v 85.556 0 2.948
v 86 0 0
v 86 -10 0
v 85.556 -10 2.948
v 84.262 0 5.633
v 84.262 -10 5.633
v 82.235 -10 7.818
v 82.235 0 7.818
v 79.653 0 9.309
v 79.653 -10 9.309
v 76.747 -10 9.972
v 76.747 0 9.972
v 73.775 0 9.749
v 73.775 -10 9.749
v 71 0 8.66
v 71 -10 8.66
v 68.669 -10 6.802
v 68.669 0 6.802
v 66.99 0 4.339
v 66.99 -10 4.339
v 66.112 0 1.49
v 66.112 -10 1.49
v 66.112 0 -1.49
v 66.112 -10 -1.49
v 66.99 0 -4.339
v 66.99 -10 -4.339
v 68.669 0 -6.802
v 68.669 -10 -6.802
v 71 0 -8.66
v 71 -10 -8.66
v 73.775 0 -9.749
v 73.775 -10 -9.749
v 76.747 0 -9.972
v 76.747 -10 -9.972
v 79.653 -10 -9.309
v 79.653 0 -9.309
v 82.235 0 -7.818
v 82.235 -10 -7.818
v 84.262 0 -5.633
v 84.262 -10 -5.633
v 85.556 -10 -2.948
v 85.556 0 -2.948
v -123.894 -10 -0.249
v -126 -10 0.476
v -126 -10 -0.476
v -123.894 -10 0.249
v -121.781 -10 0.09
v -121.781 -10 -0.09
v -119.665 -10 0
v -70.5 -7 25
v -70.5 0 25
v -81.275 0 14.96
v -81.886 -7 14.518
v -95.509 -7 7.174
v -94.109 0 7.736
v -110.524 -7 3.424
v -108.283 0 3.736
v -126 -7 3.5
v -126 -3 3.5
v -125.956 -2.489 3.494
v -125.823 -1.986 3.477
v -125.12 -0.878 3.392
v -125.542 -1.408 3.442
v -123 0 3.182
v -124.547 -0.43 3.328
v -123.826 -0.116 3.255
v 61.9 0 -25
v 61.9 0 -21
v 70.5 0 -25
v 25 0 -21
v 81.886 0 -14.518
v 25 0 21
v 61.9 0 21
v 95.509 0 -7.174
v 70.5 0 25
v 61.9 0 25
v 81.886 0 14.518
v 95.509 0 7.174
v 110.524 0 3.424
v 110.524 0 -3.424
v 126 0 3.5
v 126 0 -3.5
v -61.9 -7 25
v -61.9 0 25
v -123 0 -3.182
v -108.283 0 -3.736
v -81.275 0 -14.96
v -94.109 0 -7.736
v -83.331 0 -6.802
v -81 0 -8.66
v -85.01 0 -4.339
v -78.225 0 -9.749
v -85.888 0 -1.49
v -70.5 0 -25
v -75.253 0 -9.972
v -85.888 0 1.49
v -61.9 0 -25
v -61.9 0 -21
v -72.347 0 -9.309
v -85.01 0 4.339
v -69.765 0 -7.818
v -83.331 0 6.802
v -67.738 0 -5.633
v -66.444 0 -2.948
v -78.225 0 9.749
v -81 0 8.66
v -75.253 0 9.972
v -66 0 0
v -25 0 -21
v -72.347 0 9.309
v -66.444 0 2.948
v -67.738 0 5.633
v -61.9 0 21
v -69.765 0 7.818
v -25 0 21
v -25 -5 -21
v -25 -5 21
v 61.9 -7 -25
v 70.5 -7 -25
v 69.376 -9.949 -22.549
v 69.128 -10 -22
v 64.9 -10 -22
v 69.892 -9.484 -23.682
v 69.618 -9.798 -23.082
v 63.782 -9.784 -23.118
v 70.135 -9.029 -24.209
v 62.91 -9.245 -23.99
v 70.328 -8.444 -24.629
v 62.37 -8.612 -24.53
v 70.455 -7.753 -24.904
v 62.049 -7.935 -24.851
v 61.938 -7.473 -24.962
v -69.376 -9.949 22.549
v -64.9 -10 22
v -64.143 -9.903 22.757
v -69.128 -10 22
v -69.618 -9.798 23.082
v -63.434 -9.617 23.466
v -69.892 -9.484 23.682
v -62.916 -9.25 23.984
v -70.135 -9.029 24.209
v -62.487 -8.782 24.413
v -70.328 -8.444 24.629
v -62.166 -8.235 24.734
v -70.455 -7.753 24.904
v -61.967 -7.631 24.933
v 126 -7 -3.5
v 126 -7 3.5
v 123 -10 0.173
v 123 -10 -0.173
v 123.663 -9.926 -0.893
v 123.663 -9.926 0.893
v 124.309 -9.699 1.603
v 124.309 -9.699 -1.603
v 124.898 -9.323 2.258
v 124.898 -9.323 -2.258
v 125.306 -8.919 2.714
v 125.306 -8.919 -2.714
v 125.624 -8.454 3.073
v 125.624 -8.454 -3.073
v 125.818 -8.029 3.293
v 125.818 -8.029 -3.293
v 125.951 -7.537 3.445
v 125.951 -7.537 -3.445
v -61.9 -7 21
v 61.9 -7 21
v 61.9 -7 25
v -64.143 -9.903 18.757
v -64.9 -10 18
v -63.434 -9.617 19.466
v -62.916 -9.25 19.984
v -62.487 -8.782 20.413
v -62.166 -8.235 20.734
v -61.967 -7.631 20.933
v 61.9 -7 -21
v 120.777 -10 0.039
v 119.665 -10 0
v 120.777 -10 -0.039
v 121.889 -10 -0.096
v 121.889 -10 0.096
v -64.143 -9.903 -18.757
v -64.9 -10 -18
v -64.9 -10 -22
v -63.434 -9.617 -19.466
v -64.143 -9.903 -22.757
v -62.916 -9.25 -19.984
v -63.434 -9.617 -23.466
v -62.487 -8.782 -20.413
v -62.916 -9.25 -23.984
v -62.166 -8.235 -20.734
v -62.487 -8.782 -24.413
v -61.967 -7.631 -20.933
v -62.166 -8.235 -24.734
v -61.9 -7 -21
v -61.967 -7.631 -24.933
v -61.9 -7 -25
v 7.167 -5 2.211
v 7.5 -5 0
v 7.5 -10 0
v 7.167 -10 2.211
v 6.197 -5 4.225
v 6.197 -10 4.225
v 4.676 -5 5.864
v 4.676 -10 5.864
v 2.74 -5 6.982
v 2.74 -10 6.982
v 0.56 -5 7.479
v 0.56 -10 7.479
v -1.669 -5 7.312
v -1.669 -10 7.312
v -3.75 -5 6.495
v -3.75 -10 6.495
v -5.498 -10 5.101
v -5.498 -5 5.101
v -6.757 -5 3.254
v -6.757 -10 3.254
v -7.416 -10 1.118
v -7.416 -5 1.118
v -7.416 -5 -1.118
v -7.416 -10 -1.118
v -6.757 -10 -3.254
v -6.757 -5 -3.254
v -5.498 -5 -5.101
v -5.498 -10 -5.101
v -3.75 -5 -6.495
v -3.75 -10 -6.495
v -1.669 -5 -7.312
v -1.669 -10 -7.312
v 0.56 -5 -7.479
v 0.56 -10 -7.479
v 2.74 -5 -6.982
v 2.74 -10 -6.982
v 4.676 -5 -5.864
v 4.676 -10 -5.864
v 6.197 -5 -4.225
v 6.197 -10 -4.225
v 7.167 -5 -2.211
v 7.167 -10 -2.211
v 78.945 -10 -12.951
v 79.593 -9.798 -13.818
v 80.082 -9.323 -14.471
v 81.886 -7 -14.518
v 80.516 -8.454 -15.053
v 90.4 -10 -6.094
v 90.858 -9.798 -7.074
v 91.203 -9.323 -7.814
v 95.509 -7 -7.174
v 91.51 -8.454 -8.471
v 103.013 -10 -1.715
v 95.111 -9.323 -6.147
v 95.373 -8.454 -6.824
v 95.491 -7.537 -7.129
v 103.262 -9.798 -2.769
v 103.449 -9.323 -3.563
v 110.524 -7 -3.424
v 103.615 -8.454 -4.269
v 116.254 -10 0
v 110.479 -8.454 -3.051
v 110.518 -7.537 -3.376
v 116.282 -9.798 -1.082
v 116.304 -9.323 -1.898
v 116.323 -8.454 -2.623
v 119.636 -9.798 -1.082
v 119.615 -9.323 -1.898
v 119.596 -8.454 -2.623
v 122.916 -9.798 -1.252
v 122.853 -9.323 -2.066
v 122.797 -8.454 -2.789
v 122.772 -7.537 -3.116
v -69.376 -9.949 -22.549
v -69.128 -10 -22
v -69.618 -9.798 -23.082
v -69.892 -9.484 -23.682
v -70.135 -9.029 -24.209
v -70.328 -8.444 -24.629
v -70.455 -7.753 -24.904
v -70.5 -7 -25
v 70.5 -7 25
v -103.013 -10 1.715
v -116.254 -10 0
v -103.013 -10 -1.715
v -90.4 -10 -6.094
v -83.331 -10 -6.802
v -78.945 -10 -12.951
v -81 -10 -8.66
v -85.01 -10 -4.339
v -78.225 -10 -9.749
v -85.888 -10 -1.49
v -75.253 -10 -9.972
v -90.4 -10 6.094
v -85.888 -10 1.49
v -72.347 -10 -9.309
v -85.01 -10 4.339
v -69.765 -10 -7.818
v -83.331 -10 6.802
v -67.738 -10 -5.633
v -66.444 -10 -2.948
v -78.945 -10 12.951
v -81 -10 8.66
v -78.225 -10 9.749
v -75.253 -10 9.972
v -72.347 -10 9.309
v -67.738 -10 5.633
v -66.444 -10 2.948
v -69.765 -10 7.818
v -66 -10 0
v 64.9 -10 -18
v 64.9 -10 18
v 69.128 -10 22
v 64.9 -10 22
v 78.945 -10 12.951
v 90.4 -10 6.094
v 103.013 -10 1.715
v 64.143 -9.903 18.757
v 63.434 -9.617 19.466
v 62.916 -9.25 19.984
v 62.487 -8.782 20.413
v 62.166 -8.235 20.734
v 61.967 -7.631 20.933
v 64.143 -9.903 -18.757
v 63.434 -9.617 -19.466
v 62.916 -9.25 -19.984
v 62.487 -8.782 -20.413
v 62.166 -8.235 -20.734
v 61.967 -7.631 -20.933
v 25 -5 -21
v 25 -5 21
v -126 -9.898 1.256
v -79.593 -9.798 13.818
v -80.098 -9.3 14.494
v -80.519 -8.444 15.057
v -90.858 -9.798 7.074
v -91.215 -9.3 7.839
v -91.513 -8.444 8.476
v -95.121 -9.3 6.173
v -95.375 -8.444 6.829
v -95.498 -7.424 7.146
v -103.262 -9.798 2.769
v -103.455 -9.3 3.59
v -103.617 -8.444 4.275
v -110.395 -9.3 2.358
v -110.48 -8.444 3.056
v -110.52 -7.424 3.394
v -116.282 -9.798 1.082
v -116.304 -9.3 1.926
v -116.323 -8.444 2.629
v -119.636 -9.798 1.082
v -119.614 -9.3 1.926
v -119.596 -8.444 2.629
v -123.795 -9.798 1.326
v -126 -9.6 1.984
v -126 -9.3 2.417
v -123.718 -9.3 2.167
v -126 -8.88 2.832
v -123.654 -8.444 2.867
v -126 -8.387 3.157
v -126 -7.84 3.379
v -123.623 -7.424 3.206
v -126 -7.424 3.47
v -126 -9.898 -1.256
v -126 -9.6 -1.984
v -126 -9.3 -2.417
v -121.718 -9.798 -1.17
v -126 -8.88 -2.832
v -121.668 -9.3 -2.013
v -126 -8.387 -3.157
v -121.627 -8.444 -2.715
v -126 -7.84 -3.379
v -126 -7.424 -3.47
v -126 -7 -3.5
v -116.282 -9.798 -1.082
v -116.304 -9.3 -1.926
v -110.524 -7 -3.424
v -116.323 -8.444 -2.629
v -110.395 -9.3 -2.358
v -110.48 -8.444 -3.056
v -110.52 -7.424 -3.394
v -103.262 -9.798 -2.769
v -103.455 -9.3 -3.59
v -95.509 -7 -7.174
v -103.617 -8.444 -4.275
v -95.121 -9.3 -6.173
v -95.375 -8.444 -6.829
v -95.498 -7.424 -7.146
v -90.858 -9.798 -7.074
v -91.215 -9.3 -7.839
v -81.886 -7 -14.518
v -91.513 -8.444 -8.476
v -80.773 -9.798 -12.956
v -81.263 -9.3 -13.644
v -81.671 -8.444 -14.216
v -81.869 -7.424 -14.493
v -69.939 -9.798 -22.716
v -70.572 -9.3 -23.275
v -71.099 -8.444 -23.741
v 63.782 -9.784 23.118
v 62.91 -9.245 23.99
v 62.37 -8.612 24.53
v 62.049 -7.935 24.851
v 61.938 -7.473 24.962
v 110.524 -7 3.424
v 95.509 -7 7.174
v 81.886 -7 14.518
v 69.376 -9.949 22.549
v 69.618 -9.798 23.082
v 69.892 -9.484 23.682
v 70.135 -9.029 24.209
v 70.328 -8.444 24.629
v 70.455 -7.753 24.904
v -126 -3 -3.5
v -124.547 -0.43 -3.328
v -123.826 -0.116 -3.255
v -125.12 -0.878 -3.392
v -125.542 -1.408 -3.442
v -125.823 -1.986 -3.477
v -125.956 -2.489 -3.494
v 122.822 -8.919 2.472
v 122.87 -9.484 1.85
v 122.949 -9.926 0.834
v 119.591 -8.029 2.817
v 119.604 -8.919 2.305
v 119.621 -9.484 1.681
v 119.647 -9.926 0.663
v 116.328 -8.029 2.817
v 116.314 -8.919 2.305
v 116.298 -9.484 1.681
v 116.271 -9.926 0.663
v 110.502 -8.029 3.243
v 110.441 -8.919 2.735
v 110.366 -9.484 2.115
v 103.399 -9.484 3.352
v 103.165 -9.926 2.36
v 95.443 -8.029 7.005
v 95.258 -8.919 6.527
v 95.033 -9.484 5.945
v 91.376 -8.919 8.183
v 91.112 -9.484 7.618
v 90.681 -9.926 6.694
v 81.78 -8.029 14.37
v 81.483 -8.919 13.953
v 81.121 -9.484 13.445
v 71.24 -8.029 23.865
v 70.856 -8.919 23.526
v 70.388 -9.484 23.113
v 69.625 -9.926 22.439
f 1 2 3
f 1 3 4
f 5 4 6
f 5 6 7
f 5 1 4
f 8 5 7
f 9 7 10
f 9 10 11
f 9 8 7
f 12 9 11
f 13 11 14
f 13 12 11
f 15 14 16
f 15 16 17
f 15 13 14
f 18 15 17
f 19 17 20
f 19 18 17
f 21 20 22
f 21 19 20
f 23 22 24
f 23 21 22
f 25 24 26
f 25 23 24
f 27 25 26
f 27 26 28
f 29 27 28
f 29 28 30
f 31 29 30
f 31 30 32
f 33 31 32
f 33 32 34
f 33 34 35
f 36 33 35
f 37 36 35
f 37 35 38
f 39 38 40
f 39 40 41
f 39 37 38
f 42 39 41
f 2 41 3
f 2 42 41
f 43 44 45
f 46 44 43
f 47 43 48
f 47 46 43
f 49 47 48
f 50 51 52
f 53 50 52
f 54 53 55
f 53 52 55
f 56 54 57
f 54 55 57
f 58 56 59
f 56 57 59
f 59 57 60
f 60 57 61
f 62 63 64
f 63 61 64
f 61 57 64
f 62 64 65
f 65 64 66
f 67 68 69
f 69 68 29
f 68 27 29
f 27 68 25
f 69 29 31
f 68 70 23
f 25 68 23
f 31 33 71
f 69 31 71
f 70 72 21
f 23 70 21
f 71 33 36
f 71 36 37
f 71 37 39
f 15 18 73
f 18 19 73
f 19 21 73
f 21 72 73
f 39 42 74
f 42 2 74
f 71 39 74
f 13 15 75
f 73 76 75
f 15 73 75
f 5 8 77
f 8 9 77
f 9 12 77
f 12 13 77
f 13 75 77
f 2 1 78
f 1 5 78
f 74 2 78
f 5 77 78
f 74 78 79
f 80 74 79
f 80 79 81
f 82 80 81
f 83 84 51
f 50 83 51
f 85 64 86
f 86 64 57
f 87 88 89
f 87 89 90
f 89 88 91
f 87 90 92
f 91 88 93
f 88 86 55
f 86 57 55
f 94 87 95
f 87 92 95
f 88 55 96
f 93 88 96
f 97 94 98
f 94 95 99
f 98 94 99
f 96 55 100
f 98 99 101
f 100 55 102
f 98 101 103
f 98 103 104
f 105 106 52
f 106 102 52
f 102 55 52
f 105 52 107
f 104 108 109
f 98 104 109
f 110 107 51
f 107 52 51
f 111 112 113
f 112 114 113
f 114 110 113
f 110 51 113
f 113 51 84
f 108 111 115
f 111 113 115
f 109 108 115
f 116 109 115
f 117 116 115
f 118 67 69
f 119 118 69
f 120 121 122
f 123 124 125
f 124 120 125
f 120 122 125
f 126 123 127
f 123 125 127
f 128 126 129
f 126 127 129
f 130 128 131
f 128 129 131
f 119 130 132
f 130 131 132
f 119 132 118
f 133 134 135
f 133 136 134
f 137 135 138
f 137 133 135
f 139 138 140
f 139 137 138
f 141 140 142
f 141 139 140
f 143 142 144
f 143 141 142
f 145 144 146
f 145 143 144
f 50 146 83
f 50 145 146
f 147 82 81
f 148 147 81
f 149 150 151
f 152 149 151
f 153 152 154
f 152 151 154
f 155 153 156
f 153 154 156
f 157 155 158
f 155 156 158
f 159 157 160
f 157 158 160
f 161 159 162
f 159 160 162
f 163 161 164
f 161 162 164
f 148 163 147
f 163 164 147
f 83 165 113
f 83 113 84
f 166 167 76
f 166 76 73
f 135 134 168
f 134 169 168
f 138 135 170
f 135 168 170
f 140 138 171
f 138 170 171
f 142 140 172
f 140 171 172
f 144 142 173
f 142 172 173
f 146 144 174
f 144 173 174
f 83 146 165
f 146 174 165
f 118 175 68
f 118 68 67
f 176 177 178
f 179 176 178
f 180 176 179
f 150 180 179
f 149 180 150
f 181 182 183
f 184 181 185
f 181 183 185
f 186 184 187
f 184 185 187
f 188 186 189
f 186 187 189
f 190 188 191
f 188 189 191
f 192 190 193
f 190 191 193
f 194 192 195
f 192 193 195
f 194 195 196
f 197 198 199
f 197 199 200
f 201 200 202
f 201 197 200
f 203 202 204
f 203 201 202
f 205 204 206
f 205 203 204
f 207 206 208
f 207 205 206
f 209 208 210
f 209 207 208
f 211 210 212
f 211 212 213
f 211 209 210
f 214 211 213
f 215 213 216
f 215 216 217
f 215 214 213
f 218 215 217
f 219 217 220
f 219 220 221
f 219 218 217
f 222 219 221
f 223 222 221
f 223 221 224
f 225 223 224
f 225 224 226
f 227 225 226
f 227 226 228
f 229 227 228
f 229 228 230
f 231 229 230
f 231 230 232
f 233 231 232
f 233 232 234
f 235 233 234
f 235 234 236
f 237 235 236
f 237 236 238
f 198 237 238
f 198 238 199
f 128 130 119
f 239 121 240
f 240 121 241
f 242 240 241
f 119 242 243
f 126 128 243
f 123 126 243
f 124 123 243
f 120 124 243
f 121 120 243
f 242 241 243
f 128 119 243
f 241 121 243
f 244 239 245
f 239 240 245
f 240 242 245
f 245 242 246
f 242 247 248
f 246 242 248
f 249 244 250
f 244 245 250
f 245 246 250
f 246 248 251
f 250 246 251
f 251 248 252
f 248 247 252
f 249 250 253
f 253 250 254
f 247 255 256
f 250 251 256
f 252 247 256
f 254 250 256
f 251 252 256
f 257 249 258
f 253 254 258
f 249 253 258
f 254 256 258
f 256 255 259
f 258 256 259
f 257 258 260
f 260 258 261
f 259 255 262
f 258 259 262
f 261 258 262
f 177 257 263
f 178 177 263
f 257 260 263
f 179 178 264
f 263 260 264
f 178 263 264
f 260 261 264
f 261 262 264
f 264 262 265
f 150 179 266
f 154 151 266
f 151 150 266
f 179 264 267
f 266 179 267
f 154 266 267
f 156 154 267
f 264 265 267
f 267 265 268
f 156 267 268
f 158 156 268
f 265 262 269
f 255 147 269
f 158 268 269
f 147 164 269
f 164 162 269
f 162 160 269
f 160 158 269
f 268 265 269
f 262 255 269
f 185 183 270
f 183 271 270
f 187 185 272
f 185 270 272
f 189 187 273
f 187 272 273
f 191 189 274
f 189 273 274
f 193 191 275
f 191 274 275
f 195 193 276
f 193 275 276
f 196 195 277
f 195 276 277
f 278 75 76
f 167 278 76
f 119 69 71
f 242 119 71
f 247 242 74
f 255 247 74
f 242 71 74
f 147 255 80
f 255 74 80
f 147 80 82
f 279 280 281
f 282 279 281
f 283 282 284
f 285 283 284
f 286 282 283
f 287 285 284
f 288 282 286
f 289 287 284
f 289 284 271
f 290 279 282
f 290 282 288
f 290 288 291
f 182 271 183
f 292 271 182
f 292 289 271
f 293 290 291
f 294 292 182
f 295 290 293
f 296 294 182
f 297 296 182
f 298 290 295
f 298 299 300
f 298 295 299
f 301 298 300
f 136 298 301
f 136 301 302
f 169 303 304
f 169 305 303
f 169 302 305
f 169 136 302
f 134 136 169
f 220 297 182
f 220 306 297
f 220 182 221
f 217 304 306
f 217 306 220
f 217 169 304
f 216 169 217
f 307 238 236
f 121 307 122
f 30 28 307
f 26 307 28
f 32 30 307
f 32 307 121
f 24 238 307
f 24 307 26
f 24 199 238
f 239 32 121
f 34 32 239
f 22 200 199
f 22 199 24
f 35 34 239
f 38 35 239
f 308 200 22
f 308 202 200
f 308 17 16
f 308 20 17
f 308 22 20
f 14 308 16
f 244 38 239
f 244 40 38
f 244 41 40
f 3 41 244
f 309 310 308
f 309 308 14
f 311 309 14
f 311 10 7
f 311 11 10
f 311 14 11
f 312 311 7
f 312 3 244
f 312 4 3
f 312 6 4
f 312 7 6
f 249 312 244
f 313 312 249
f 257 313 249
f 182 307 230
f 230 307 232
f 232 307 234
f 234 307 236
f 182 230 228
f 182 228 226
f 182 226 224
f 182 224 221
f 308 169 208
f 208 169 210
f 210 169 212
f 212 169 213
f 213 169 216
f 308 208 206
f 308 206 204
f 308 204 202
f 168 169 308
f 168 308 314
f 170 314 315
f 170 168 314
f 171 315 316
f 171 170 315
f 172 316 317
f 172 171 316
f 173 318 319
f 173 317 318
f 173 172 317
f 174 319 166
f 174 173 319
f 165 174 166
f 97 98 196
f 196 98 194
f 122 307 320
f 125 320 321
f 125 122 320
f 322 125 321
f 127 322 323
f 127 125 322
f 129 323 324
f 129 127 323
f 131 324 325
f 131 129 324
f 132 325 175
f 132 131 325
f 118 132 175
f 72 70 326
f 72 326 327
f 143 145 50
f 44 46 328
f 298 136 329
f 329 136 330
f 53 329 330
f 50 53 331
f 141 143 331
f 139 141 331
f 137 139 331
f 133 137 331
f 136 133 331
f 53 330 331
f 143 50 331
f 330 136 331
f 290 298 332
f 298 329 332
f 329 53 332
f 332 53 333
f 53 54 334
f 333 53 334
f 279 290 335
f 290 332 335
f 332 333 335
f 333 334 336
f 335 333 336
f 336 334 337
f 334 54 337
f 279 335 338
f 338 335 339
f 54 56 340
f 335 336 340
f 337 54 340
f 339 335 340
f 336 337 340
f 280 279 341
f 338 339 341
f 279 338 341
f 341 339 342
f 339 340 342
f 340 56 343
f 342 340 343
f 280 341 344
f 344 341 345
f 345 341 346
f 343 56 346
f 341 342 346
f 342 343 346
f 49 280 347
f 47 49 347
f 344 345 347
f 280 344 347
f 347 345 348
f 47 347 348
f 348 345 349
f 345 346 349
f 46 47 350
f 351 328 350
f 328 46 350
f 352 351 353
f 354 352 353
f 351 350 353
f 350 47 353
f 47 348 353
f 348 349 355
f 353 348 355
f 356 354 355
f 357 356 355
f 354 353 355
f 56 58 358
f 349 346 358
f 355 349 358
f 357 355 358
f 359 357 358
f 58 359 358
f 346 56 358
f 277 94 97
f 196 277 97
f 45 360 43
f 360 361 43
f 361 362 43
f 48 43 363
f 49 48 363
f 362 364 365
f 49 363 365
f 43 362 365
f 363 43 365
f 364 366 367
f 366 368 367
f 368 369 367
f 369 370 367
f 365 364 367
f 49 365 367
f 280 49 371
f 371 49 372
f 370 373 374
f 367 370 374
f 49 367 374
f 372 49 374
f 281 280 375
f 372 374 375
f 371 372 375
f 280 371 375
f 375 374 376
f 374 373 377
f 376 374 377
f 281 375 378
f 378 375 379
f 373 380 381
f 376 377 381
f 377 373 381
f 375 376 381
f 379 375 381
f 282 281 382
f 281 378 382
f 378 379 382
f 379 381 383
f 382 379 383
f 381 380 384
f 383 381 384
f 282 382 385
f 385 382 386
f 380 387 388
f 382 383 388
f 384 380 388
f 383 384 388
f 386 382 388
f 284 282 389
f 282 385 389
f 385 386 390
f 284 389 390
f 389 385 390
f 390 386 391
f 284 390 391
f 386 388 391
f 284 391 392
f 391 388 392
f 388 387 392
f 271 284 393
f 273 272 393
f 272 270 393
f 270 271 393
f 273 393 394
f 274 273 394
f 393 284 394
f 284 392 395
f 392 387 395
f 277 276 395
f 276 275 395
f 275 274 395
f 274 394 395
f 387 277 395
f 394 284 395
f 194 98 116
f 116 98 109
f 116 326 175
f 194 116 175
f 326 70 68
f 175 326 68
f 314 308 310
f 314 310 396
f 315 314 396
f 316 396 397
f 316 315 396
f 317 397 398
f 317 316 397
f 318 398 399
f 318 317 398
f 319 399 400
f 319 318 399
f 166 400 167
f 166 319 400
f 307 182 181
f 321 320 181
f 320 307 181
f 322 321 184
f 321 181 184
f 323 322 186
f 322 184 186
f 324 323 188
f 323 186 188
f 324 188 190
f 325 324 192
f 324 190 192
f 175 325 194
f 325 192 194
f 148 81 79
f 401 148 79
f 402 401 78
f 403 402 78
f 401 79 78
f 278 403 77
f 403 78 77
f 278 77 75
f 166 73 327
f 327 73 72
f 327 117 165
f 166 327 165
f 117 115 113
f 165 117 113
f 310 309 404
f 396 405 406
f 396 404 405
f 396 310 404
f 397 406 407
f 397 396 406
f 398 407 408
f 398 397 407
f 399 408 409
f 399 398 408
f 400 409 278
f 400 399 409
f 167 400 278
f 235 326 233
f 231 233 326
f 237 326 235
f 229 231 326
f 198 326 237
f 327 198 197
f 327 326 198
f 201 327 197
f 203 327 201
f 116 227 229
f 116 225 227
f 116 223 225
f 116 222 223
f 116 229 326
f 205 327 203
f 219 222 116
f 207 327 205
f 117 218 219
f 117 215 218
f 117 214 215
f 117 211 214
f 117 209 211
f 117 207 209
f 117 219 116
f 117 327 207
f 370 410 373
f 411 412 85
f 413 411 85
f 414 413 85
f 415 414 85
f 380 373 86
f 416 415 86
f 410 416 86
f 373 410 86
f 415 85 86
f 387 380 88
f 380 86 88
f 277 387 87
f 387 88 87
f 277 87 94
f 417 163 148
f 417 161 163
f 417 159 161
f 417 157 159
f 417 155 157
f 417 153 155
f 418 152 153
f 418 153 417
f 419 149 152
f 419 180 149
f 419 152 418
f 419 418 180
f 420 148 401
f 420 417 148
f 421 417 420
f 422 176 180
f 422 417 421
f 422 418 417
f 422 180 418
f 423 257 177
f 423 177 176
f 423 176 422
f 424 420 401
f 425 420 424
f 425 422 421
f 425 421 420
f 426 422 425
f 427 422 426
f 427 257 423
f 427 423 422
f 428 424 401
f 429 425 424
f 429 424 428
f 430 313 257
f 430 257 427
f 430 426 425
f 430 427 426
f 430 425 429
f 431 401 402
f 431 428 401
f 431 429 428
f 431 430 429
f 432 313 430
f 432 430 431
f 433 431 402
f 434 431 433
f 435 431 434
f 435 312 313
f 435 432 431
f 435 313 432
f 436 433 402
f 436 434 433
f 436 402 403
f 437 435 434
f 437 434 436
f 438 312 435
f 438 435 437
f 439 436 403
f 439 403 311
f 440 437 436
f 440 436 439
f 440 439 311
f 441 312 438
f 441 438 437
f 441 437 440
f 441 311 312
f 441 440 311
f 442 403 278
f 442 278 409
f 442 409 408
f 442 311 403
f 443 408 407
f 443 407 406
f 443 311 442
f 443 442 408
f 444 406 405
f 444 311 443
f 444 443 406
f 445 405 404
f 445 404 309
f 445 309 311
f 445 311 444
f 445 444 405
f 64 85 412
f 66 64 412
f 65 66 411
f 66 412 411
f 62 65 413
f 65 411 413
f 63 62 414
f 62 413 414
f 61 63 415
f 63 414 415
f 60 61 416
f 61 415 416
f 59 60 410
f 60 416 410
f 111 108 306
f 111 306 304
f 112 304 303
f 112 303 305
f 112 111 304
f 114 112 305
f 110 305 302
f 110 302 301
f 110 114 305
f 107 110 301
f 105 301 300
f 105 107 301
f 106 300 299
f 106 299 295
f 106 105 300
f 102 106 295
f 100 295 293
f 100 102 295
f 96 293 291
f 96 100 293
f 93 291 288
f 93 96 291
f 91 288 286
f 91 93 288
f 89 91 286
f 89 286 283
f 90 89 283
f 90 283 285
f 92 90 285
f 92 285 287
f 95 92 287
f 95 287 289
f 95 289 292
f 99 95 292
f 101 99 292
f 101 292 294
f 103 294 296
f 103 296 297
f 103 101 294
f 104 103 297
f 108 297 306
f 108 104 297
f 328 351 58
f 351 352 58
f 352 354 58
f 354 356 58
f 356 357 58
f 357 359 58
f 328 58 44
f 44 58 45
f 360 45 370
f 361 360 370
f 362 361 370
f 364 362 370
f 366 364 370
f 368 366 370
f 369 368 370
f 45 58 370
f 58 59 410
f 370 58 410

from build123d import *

# Parameters (mm, degrees)
F0_R         = 10
F0_R_2       = 7.5
F1_DEPTH     = 10
F2_W         = 50
F2_H         = 42
F2_R         = 7.5
F3_DEPTH     = 5
F4_T1_DEPTH  = 123.8
F4_T3_DEPTH  = 11.5
F4_T5_DEPTH  = 23.6
F4_T7_DEPTH  = 22
F4_T9_DEPTH  = 11.5
F4_T11_DEPTH = 23.6
F4_T14_ANGLE = 71.0490813257
F4_T16_ANGLE = 71.0490813257
F4_T18_ANGLE = 71.0490813257
F4_T20_ANGLE = 71.0490813257
F4_T25_DEPTH = 19
F4_T29_DEPTH = 131.3
F4_T36_DEPTH = 131.3
F4_T40_DEPTH = 19
F4_T47_DEPTH = 19
F4_T51_DEPTH = 131.3
F4_T58_DEPTH = 131.3
F4_T62_DEPTH = 19


# Not quite as in the source:
# - a fillet or chamfer that OpenCascade refuses, or shapes differently, is made with other operations: its cross-section is extruded or revolved along the edge and cut away or added


with BuildPart() as f1:
    # F0 (on Front) → F1 (new body)
    with BuildSketch(Plane.XZ):
        with BuildLine():
            ThreePointArc((126, 3.5), (95.5089399385, 7.1742403064), (70.5, 25))
            Line((70.5, 25), (61.9, 25))
            Line((61.9, 25), (61.9, 21))
            Line((61.9, 21), (-61.9, 21))
            Line((-61.9, 21), (-61.9, 25))
            Line((-61.9, 25), (-70.5, 25))
            ThreePointArc((-70.5, 25), (-95.5089399385, 7.1742403064), (-126, 3.5))
            Line((-126, 3.5), (-126, -3.5))
            ThreePointArc((-126, -3.5), (-95.5089399385, -7.1742403064), (-70.5, -25))
            Line((-70.5, -25), (-61.9, -25))
            Line((-61.9, -25), (-61.9, -21))
            Line((-61.9, -21), (61.9, -21))
            Line((61.9, -21), (61.9, -25))
            Line((61.9, -25), (70.5, -25))
            ThreePointArc((70.5, -25), (95.5089399385, -7.1742403064), (126, -3.5))
            Line((126, -3.5), (126, 3.5))
        make_face()
        with Locations((-76, 0)):
            Circle(F0_R, mode=Mode.SUBTRACT)
        Circle(F0_R_2, mode=Mode.SUBTRACT)
        with Locations((76, 0)):
            Circle(F0_R, mode=Mode.SUBTRACT)
    extrude(amount=F1_DEPTH)

    # F2 (on face) → F3 (cut)
    with BuildSketch(Plane(origin=(0, 0, 0), x_dir=(-1, 0, 0), z_dir=(0, 1, 0))):
        Rectangle(F2_W, F2_H)
        Circle(F2_R, mode=Mode.SUBTRACT)
    extrude(amount=-F3_DEPTH, mode=Mode.SUBTRACT)

    # F4: fillet of radius 3 on 16 edges, made by hand

    # F4_s2 → F4_t1 (cut)
    with BuildSketch(Plane.YZ.offset(-61.9)):
        with BuildLine():
            ThreePointArc((-10, -18), (-9.1213203436, -20.1213203436), (-7, -21))
            Line((-7, -21), (-10, -21))
            Line((-10, -21), (-10, -18))
        make_face()
        with BuildLine():
            ThreePointArc((-10, 18), (-9.1213203436, 20.1213203436), (-7, 21))
            Line((-7, 21), (-10, 21))
            Line((-10, 21), (-10, 18))
        make_face()
    extrude(amount=F4_T1_DEPTH, mode=Mode.SUBTRACT)

    # F4_s4 → F4_t3 (cut)
    with BuildSketch(Plane.XY.offset(-32.5)):
        with BuildLine():
            ThreePointArc((64.9, -10), (62.7786796564, -9.1213203436), (61.9, -7))
            Line((61.9, -7), (61.9, -10))
            Line((61.9, -10), (64.9, -10))
        make_face()
        with BuildLine():
            ThreePointArc((-64.9, -10), (-62.7786796564, -9.1213203436), (-61.9, -7))
            Line((-61.9, -7), (-61.9, -10))
            Line((-61.9, -10), (-64.9, -10))
        make_face()
    extrude(amount=F4_T3_DEPTH, mode=Mode.SUBTRACT)

    # F4_s6 → F4_t5 (cut)
    with BuildSketch(Plane.YZ.offset(54.4)):
        with BuildLine():
            ThreePointArc((-10, -22), (-9.1213203436, -24.1213203436), (-7, -25))
            Line((-7, -25), (-10, -25))
            Line((-10, -25), (-10, -22))
        make_face()
        with BuildLine():
            ThreePointArc((-10, 22), (-9.1213203436, 24.1213203436), (-7, 25))
            Line((-7, 25), (-10, 25))
            Line((-10, 25), (-10, 22))
        make_face()
    extrude(amount=F4_T5_DEPTH, mode=Mode.SUBTRACT)

    # F4_s8 → F4_t7 (cut)
    with BuildSketch(Plane.XY.offset(-11)):
        with BuildLine():
            ThreePointArc((123, -10), (125.1213203436, -9.1213203436), (126, -7))
            Line((126, -7), (126, -10))
            Line((126, -10), (123, -10))
        make_face()
        with BuildLine():
            ThreePointArc((-123, 0), (-125.1213203436, -0.8786796564), (-126, -3))
            Line((-126, -3), (-126, 0))
            Line((-126, 0), (-123, 0))
        make_face()
    extrude(amount=F4_T7_DEPTH, mode=Mode.SUBTRACT)

    # F4_s10 → F4_t9 (cut)
    with BuildSketch(Plane.XY.offset(21)):
        with BuildLine():
            ThreePointArc((64.9, -10), (62.7786796564, -9.1213203436), (61.9, -7))
            Line((61.9, -7), (61.9, -10))
            Line((61.9, -10), (64.9, -10))
        make_face()
        with BuildLine():
            ThreePointArc((-64.9, -10), (-62.7786796564, -9.1213203436), (-61.9, -7))
            Line((-61.9, -7), (-61.9, -10))
            Line((-61.9, -10), (-64.9, -10))
        make_face()
    extrude(amount=F4_T9_DEPTH, mode=Mode.SUBTRACT)

    # F4_s12 → F4_t11 (cut)
    with BuildSketch(Plane.YZ.offset(-78)):
        with BuildLine():
            ThreePointArc((-10, 22), (-9.1213203436, 24.1213203436), (-7, 25))
            Line((-7, 25), (-10, 25))
            Line((-10, 25), (-10, 22))
        make_face()
        with BuildLine():
            ThreePointArc((-10, -22), (-9.1213203436, -24.1213203436), (-7, -25))
            Line((-7, -25), (-10, -25))
            Line((-10, -25), (-10, -22))
        make_face()
    extrude(amount=F4_T11_DEPTH, mode=Mode.SUBTRACT)

    # F4_s13 → F4_t14 (revolve, cut)
    with BuildSketch(Plane(origin=(5.6700188901, 0, 8.6318707647), x_dir=(0, 1, 0), z_dir=(-0.5490187323, 0, -0.8358100452))):
        with BuildLine():
            ThreePointArc((-10, 69.1979444633), (-9.1213203436, 71.3192648069), (-7, 72.1979444633))
            Line((-7, 72.1979444633), (-10, 72.1979444633))
            Line((-10, 72.1979444633), (-10, 69.1979444633))
        make_face()
    revolve(axis=Axis((117.9593619468, -10, -65.127655258), (0, 1, 0)), revolution_arc=F4_T14_ANGLE, mode=Mode.SUBTRACT)

    # F4_s15 → F4_t16 (revolve, cut)
    with BuildSketch(Plane(origin=(126.3513869763, 0, 32.3212006938), x_dir=(0, 1, 0), z_dir=(0.9688050004, 0, 0.2478242748))):
        with BuildLine():
            ThreePointArc((-7, -28.2871731549), (-9.1213203436, -29.1658528113), (-10, -31.2871731549))
            Line((-10, -31.2871731549), (-10, -28.2871731549))
            Line((-10, -28.2871731549), (-7, -28.2871731549))
        make_face()
    revolve(axis=Axis((117.9593619468, -10, 65.127655258), (0, 1, 0)), revolution_arc=F4_T16_ANGLE, mode=Mode.SUBTRACT)

    # F4_s17 → F4_t18 (revolve, cut)
    with BuildSketch(Plane(origin=(-5.6700188901, 0, -8.6318707647), x_dir=(0, 1, 0), z_dir=(0.5490187323, 0, 0.8358100452))):
        with BuildLine():
            ThreePointArc((-10, 69.1979444633), (-9.1213203436, 71.3192648069), (-7, 72.1979444633))
            Line((-7, 72.1979444633), (-10, 72.1979444633))
            Line((-10, 72.1979444633), (-10, 69.1979444633))
        make_face()
    revolve(axis=Axis((-117.9593619468, -10, 65.127655258), (0, 1, 0)), revolution_arc=F4_T18_ANGLE, mode=Mode.SUBTRACT)

    # F4_s19 → F4_t20 (revolve, cut)
    with BuildSketch(Plane(origin=(-126.3513869763, 0, -32.3212006938), x_dir=(0, 1, 0), z_dir=(-0.9688050004, 0, -0.2478242748))):
        with BuildLine():
            ThreePointArc((-10, -31.2871731549), (-9.1213203436, -29.1658528113), (-7, -28.2871731549))
            Line((-7, -28.2871731549), (-10, -28.2871731549))
            Line((-10, -28.2871731549), (-10, -31.2871731549))
        make_face()
    revolve(axis=Axis((-117.9593619468, -10, -65.127655258), (0, 1, 0)), revolution_arc=F4_T20_ANGLE, mode=Mode.SUBTRACT)


with BuildPart() as f4_tool23:
    # F4_s24 → F4_t25 (new body)
    with BuildSketch(Plane.XY.offset(-32.5)):
        with BuildLine():
            ThreePointArc((-64.9, -10), (-62.7786796564, -9.1213203436), (-61.9, -7))
            Line((-61.9, -7), (-61.9, -10))
            Line((-61.9, -10), (-64.9, -10))
        make_face()
    extrude(amount=F4_T25_DEPTH)

    split(bisect_by=Plane.XY.offset(-21), keep=Keep.TOP)


with BuildPart() as f4_tool27:
    # F4_s28 → F4_t29 (new body)
    with BuildSketch(Plane.YZ.offset(-69.4)):
        with BuildLine():
            ThreePointArc((-10, -18), (-9.1213203436, -20.1213203436), (-7, -21))
            Line((-7, -21), (-10, -21))
            Line((-10, -21), (-10, -18))
        make_face()
    extrude(amount=F4_T29_DEPTH)

    split(bisect_by=Plane.YZ.offset(-61.9), keep=Keep.BOTTOM)


with BuildPart() as f4_tool23_1:
    add(f4_tool23.part)

    # F4_t31: intersect F4_tool27
    add(f4_tool27.part, mode=Mode.INTERSECT)


with BuildPart() as f1_1:
    add(f1.part)

    # F4_t21: cut F4_tool23
    add(f4_tool23_1.part, mode=Mode.SUBTRACT)


with BuildPart() as f4_tool34:
    # F4_s35 → F4_t36 (new body)
    with BuildSketch(Plane.YZ.offset(-61.9)):
        with BuildLine():
            ThreePointArc((-10, -18), (-9.1213203436, -20.1213203436), (-7, -21))
            Line((-7, -21), (-10, -21))
            Line((-10, -21), (-10, -18))
        make_face()
    extrude(amount=F4_T36_DEPTH)

    split(bisect_by=Plane.YZ.offset(61.9), keep=Keep.TOP)


with BuildPart() as f4_tool38:
    # F4_s39 → F4_t40 (new body)
    with BuildSketch(Plane.XY.offset(-13.5)):
        with BuildLine():
            ThreePointArc((64.9, -10), (62.7786796564, -9.1213203436), (61.9, -7))
            Line((61.9, -7), (61.9, -10))
            Line((61.9, -10), (64.9, -10))
        make_face()
    extrude(amount=-F4_T40_DEPTH)

    split(bisect_by=Plane.XY.offset(-21), keep=Keep.TOP)


with BuildPart() as f4_tool34_1:
    add(f4_tool34.part)

    # F4_t42: intersect F4_tool38
    add(f4_tool38.part, mode=Mode.INTERSECT)


with BuildPart() as f1_2:
    add(f1_1.part)

    # F4_t32: cut F4_tool34
    add(f4_tool34_1.part, mode=Mode.SUBTRACT)


with BuildPart() as f4_tool45:
    # F4_s46 → F4_t47 (new body)
    with BuildSketch(Plane.XY.offset(32.5)):
        with BuildLine():
            ThreePointArc((64.9, -10), (62.7786796564, -9.1213203436), (61.9, -7))
            Line((61.9, -7), (61.9, -10))
            Line((61.9, -10), (64.9, -10))
        make_face()
    extrude(amount=-F4_T47_DEPTH)

    split(bisect_by=Plane.XY.offset(21), keep=Keep.BOTTOM)


with BuildPart() as f4_tool49:
    # F4_s50 → F4_t51 (new body)
    with BuildSketch(Plane.YZ.offset(69.4)):
        with BuildLine():
            ThreePointArc((-10, 18), (-9.1213203436, 20.1213203436), (-7, 21))
            Line((-7, 21), (-10, 21))
            Line((-10, 21), (-10, 18))
        make_face()
    extrude(amount=-F4_T51_DEPTH)

    split(bisect_by=Plane.YZ.offset(61.9), keep=Keep.TOP)


with BuildPart() as f4_tool45_1:
    add(f4_tool45.part)

    # F4_t53: intersect F4_tool49
    add(f4_tool49.part, mode=Mode.INTERSECT)


with BuildPart() as f1_3:
    add(f1_2.part)

    # F4_t43: cut F4_tool45
    add(f4_tool45_1.part, mode=Mode.SUBTRACT)


with BuildPart() as f4_tool56:
    # F4_s57 → F4_t58 (new body)
    with BuildSketch(Plane.YZ.offset(61.9)):
        with BuildLine():
            ThreePointArc((-10, 18), (-9.1213203436, 20.1213203436), (-7, 21))
            Line((-7, 21), (-10, 21))
            Line((-10, 21), (-10, 18))
        make_face()
    extrude(amount=-F4_T58_DEPTH)

    split(bisect_by=Plane.YZ.offset(-61.9), keep=Keep.BOTTOM)


with BuildPart() as f4_tool60:
    # F4_s61 → F4_t62 (new body)
    with BuildSketch(Plane.XY.offset(13.5)):
        with BuildLine():
            ThreePointArc((-64.9, -10), (-62.7786796564, -9.1213203436), (-61.9, -7))
            Line((-61.9, -7), (-61.9, -10))
            Line((-61.9, -10), (-64.9, -10))
        make_face()
    extrude(amount=F4_T62_DEPTH)

    split(bisect_by=Plane.XY.offset(21), keep=Keep.BOTTOM)


with BuildPart() as f4_tool56_1:
    add(f4_tool56.part)

    # F4_t64: intersect F4_tool60
    add(f4_tool60.part, mode=Mode.INTERSECT)


with BuildPart() as f1_4:
    add(f1_3.part)

    # F4_t54: cut F4_tool56
    add(f4_tool56_1.part, mode=Mode.SUBTRACT)


solid = f1_4.part
